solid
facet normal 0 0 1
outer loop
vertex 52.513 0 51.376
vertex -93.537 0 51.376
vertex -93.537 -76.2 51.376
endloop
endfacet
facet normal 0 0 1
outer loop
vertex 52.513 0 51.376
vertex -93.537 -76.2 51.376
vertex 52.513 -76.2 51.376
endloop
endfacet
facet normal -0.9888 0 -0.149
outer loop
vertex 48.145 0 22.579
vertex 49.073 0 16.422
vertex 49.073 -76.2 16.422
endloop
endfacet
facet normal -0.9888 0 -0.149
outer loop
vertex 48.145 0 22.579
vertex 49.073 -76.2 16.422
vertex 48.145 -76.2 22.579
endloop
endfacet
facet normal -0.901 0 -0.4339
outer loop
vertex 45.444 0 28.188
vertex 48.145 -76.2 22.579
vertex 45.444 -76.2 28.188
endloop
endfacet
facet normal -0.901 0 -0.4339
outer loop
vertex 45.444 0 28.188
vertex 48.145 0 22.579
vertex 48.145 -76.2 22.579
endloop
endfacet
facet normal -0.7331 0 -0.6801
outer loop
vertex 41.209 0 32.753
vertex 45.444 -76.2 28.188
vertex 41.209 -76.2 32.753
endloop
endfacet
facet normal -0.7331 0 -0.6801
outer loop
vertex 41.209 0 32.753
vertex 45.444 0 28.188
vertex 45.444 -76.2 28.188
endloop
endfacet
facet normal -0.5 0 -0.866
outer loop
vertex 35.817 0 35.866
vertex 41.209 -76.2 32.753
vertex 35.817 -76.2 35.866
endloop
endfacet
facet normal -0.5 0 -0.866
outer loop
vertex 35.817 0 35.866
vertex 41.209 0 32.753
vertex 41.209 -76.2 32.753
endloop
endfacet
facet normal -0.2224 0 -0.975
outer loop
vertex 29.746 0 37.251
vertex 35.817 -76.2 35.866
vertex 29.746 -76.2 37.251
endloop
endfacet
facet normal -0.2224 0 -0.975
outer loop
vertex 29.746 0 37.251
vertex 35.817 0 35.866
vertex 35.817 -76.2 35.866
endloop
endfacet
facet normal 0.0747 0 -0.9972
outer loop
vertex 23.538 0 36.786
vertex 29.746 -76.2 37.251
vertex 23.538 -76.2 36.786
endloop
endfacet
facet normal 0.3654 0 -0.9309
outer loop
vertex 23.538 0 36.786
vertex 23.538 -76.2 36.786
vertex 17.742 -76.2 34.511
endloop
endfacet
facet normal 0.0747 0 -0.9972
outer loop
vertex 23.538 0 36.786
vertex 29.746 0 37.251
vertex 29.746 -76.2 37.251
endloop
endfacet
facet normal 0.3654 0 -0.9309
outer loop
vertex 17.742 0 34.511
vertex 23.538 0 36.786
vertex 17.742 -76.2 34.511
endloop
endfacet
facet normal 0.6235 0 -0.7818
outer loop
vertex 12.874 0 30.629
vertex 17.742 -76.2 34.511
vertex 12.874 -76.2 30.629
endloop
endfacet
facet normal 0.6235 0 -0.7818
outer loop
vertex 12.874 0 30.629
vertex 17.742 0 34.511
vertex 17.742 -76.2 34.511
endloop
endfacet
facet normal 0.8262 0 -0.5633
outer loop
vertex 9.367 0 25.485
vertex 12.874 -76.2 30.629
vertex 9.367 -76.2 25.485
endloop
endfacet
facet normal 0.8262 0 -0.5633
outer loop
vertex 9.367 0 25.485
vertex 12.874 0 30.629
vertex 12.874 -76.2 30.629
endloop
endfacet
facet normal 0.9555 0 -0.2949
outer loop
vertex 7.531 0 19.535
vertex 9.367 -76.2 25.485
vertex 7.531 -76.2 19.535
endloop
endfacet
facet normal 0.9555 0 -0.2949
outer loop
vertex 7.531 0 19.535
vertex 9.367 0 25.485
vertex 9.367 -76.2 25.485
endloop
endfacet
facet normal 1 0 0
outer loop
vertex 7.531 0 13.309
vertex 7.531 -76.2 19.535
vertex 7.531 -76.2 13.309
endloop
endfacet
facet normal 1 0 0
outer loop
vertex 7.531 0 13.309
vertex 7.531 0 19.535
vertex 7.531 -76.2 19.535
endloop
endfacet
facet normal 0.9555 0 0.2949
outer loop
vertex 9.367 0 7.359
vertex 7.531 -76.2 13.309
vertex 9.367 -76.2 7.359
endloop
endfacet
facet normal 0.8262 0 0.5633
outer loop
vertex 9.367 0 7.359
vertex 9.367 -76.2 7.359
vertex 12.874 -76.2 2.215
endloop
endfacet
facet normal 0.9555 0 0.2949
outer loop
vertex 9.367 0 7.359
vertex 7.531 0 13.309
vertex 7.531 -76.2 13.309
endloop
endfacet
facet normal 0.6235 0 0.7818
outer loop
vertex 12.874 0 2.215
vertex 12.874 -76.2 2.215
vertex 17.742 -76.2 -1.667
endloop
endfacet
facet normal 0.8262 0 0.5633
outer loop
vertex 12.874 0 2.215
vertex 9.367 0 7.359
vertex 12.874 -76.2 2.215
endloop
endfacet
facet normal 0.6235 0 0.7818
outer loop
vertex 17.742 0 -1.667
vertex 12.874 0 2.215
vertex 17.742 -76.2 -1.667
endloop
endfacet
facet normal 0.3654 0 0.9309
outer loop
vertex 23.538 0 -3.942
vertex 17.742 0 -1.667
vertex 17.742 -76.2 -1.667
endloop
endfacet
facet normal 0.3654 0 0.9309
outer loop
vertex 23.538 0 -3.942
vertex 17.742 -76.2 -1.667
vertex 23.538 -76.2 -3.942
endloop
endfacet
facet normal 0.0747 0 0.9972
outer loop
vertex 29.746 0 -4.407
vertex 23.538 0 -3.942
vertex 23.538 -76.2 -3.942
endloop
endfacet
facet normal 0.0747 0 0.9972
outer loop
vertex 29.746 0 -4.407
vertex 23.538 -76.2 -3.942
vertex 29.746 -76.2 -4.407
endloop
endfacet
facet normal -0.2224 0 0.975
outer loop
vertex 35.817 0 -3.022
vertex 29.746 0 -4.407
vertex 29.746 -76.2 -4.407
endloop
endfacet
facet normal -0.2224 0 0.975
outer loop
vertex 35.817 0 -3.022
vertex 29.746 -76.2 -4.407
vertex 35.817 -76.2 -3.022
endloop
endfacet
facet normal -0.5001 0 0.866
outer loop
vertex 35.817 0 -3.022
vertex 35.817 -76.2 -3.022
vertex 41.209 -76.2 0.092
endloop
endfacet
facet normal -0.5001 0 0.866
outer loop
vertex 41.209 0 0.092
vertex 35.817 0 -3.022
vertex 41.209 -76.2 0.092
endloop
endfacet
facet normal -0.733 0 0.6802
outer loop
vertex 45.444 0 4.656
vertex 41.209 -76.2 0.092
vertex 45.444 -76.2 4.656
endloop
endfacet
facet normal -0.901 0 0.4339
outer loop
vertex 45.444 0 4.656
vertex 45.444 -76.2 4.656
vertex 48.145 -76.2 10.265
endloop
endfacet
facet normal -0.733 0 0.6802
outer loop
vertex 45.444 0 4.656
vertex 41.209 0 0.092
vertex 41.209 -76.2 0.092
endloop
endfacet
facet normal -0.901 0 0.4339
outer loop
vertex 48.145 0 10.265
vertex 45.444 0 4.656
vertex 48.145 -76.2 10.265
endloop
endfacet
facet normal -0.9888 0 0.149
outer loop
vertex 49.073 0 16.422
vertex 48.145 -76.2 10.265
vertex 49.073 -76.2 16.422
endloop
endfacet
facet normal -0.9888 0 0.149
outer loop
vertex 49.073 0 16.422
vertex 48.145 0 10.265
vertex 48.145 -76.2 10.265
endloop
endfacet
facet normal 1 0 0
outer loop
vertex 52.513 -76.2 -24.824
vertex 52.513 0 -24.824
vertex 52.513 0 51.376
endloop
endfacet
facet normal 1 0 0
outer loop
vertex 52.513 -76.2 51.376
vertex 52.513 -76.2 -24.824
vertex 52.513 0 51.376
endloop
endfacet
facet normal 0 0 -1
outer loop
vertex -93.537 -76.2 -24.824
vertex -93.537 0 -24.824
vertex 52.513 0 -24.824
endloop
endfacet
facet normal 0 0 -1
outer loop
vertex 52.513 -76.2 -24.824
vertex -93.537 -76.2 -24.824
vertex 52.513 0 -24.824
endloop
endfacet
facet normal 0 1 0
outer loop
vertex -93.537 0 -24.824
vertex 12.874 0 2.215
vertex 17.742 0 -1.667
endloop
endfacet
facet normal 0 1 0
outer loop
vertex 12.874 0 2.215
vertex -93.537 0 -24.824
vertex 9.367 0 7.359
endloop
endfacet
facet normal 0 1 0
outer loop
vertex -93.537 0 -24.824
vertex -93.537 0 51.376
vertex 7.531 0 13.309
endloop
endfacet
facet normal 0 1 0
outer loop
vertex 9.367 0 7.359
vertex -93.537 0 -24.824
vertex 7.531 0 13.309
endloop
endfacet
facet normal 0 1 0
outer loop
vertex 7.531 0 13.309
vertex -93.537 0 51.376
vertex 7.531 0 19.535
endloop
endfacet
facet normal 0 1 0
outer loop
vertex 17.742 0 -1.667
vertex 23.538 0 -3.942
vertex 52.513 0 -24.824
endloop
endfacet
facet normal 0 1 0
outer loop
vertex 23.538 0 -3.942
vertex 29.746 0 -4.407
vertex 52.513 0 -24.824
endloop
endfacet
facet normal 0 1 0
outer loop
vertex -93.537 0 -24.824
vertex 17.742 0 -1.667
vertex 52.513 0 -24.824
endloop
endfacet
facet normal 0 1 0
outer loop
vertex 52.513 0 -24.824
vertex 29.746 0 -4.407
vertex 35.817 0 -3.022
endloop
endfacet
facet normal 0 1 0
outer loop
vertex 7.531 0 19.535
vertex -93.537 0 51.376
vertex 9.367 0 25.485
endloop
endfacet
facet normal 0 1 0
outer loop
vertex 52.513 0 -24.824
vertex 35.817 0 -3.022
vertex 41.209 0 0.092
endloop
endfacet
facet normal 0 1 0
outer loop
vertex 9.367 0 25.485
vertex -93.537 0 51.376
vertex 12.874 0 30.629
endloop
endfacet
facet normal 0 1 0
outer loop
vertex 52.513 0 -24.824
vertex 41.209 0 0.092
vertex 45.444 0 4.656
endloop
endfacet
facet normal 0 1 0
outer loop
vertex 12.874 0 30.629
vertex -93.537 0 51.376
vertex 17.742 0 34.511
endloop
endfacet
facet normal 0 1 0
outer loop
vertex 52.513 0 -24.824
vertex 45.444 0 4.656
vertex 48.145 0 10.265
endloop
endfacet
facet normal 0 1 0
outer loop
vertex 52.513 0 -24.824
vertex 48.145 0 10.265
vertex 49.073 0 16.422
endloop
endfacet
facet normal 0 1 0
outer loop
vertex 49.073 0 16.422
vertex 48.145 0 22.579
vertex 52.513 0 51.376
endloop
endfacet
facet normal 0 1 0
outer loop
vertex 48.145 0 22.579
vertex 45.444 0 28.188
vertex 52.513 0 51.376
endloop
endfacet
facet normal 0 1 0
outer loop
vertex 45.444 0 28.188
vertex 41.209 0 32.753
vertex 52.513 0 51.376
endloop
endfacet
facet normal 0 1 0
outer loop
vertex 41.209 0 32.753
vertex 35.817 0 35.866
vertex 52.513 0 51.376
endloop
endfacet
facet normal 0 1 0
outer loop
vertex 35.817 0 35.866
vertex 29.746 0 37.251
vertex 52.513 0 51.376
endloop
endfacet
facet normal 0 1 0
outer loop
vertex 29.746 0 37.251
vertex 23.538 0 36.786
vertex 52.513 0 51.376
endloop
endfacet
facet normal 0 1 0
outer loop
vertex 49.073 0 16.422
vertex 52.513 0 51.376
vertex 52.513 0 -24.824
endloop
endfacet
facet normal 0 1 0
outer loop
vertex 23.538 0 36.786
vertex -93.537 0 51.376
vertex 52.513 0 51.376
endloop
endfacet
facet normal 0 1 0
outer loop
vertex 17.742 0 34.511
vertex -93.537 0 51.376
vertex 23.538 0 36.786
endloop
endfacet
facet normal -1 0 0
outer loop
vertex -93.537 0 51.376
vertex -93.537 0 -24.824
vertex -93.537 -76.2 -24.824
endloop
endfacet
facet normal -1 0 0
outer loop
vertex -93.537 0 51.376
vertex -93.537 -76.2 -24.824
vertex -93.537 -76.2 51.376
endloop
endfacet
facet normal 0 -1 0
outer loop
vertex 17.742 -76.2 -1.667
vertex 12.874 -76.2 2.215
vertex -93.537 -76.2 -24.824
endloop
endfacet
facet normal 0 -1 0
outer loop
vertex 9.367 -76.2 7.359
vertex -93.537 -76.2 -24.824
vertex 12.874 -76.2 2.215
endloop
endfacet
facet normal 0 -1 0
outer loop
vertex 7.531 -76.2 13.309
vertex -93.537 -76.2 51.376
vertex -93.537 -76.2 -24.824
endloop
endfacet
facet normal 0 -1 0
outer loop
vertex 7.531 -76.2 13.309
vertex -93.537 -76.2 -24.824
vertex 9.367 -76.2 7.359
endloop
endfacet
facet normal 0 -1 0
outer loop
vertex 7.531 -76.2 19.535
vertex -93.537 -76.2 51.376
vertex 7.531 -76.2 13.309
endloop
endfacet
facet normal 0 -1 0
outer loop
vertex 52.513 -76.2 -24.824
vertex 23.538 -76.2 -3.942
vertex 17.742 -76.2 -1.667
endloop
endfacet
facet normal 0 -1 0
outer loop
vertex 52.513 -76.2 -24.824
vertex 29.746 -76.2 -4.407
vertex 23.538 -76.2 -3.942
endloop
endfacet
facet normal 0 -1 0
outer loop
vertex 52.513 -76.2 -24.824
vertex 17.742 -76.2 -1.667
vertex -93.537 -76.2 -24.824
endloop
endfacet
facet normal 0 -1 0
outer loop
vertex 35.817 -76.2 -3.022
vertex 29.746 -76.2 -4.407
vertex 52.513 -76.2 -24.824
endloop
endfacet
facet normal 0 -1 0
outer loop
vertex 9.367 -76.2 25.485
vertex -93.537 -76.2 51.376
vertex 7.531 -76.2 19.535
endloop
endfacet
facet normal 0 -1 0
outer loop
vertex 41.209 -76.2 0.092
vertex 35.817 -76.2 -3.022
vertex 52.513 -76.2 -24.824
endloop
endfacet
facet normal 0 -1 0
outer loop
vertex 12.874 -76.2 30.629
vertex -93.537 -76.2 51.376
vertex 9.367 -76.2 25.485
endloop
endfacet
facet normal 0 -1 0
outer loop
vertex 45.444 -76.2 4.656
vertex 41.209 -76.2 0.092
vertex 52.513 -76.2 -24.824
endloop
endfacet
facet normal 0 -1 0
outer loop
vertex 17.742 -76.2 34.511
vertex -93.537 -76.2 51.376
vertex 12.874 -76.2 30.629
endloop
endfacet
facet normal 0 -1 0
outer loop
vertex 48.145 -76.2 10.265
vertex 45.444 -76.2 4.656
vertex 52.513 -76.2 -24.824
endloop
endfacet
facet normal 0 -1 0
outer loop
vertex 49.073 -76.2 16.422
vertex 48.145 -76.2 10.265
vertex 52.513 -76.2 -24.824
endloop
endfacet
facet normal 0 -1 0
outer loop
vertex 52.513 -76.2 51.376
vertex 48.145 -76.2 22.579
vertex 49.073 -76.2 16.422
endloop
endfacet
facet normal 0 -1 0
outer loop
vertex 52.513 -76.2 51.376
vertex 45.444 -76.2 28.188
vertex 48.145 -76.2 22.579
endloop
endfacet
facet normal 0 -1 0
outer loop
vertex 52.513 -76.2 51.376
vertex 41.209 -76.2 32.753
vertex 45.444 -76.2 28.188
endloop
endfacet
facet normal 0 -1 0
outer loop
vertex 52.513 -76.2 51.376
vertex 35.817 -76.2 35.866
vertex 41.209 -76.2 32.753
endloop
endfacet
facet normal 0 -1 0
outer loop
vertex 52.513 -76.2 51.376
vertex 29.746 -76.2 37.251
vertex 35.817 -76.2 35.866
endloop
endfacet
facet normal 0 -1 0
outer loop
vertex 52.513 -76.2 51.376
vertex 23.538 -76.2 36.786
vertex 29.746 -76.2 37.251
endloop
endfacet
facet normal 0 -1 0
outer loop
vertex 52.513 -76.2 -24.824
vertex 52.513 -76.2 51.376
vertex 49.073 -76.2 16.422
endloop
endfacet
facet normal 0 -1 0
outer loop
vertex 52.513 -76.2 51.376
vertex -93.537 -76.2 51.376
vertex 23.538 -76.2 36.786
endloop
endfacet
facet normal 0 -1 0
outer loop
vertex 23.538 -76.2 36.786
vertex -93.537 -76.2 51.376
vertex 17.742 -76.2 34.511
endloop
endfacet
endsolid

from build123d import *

# Parameters (mm, degrees)
F0_W     = 146.05
F0_H     = 76.2
F2_DEPTH = 76.2
F3_R     = 20.887507
F4_DEPTH = 76.2
F1_W     = 25.4
F1_H     = 25.4
F5_DEPTH = 76.2


with BuildPart() as f2:
    # F0 (on Front) → F2 (new body)
    with BuildSketch(Plane.XZ):
        with Locations((-20.51247, 13.275895)):
            Rectangle(F0_W, F0_H)
    extrude(amount=F2_DEPTH)

    # F3 (on face) → F4 (cut)
    with BuildSketch(Plane.XZ):
        with Locations((28.185513, 16.4221)):
            Circle(F3_R)
    extrude(amount=F4_DEPTH, mode=Mode.SUBTRACT)

    # F1 (on face) → F5 (join)
    with BuildSketch(Plane.XZ):
        with Locations((-52.30484, 12.7)):
            Rectangle(F1_W, F1_H)
    extrude(amount=F5_DEPTH)


solid = f2.part
